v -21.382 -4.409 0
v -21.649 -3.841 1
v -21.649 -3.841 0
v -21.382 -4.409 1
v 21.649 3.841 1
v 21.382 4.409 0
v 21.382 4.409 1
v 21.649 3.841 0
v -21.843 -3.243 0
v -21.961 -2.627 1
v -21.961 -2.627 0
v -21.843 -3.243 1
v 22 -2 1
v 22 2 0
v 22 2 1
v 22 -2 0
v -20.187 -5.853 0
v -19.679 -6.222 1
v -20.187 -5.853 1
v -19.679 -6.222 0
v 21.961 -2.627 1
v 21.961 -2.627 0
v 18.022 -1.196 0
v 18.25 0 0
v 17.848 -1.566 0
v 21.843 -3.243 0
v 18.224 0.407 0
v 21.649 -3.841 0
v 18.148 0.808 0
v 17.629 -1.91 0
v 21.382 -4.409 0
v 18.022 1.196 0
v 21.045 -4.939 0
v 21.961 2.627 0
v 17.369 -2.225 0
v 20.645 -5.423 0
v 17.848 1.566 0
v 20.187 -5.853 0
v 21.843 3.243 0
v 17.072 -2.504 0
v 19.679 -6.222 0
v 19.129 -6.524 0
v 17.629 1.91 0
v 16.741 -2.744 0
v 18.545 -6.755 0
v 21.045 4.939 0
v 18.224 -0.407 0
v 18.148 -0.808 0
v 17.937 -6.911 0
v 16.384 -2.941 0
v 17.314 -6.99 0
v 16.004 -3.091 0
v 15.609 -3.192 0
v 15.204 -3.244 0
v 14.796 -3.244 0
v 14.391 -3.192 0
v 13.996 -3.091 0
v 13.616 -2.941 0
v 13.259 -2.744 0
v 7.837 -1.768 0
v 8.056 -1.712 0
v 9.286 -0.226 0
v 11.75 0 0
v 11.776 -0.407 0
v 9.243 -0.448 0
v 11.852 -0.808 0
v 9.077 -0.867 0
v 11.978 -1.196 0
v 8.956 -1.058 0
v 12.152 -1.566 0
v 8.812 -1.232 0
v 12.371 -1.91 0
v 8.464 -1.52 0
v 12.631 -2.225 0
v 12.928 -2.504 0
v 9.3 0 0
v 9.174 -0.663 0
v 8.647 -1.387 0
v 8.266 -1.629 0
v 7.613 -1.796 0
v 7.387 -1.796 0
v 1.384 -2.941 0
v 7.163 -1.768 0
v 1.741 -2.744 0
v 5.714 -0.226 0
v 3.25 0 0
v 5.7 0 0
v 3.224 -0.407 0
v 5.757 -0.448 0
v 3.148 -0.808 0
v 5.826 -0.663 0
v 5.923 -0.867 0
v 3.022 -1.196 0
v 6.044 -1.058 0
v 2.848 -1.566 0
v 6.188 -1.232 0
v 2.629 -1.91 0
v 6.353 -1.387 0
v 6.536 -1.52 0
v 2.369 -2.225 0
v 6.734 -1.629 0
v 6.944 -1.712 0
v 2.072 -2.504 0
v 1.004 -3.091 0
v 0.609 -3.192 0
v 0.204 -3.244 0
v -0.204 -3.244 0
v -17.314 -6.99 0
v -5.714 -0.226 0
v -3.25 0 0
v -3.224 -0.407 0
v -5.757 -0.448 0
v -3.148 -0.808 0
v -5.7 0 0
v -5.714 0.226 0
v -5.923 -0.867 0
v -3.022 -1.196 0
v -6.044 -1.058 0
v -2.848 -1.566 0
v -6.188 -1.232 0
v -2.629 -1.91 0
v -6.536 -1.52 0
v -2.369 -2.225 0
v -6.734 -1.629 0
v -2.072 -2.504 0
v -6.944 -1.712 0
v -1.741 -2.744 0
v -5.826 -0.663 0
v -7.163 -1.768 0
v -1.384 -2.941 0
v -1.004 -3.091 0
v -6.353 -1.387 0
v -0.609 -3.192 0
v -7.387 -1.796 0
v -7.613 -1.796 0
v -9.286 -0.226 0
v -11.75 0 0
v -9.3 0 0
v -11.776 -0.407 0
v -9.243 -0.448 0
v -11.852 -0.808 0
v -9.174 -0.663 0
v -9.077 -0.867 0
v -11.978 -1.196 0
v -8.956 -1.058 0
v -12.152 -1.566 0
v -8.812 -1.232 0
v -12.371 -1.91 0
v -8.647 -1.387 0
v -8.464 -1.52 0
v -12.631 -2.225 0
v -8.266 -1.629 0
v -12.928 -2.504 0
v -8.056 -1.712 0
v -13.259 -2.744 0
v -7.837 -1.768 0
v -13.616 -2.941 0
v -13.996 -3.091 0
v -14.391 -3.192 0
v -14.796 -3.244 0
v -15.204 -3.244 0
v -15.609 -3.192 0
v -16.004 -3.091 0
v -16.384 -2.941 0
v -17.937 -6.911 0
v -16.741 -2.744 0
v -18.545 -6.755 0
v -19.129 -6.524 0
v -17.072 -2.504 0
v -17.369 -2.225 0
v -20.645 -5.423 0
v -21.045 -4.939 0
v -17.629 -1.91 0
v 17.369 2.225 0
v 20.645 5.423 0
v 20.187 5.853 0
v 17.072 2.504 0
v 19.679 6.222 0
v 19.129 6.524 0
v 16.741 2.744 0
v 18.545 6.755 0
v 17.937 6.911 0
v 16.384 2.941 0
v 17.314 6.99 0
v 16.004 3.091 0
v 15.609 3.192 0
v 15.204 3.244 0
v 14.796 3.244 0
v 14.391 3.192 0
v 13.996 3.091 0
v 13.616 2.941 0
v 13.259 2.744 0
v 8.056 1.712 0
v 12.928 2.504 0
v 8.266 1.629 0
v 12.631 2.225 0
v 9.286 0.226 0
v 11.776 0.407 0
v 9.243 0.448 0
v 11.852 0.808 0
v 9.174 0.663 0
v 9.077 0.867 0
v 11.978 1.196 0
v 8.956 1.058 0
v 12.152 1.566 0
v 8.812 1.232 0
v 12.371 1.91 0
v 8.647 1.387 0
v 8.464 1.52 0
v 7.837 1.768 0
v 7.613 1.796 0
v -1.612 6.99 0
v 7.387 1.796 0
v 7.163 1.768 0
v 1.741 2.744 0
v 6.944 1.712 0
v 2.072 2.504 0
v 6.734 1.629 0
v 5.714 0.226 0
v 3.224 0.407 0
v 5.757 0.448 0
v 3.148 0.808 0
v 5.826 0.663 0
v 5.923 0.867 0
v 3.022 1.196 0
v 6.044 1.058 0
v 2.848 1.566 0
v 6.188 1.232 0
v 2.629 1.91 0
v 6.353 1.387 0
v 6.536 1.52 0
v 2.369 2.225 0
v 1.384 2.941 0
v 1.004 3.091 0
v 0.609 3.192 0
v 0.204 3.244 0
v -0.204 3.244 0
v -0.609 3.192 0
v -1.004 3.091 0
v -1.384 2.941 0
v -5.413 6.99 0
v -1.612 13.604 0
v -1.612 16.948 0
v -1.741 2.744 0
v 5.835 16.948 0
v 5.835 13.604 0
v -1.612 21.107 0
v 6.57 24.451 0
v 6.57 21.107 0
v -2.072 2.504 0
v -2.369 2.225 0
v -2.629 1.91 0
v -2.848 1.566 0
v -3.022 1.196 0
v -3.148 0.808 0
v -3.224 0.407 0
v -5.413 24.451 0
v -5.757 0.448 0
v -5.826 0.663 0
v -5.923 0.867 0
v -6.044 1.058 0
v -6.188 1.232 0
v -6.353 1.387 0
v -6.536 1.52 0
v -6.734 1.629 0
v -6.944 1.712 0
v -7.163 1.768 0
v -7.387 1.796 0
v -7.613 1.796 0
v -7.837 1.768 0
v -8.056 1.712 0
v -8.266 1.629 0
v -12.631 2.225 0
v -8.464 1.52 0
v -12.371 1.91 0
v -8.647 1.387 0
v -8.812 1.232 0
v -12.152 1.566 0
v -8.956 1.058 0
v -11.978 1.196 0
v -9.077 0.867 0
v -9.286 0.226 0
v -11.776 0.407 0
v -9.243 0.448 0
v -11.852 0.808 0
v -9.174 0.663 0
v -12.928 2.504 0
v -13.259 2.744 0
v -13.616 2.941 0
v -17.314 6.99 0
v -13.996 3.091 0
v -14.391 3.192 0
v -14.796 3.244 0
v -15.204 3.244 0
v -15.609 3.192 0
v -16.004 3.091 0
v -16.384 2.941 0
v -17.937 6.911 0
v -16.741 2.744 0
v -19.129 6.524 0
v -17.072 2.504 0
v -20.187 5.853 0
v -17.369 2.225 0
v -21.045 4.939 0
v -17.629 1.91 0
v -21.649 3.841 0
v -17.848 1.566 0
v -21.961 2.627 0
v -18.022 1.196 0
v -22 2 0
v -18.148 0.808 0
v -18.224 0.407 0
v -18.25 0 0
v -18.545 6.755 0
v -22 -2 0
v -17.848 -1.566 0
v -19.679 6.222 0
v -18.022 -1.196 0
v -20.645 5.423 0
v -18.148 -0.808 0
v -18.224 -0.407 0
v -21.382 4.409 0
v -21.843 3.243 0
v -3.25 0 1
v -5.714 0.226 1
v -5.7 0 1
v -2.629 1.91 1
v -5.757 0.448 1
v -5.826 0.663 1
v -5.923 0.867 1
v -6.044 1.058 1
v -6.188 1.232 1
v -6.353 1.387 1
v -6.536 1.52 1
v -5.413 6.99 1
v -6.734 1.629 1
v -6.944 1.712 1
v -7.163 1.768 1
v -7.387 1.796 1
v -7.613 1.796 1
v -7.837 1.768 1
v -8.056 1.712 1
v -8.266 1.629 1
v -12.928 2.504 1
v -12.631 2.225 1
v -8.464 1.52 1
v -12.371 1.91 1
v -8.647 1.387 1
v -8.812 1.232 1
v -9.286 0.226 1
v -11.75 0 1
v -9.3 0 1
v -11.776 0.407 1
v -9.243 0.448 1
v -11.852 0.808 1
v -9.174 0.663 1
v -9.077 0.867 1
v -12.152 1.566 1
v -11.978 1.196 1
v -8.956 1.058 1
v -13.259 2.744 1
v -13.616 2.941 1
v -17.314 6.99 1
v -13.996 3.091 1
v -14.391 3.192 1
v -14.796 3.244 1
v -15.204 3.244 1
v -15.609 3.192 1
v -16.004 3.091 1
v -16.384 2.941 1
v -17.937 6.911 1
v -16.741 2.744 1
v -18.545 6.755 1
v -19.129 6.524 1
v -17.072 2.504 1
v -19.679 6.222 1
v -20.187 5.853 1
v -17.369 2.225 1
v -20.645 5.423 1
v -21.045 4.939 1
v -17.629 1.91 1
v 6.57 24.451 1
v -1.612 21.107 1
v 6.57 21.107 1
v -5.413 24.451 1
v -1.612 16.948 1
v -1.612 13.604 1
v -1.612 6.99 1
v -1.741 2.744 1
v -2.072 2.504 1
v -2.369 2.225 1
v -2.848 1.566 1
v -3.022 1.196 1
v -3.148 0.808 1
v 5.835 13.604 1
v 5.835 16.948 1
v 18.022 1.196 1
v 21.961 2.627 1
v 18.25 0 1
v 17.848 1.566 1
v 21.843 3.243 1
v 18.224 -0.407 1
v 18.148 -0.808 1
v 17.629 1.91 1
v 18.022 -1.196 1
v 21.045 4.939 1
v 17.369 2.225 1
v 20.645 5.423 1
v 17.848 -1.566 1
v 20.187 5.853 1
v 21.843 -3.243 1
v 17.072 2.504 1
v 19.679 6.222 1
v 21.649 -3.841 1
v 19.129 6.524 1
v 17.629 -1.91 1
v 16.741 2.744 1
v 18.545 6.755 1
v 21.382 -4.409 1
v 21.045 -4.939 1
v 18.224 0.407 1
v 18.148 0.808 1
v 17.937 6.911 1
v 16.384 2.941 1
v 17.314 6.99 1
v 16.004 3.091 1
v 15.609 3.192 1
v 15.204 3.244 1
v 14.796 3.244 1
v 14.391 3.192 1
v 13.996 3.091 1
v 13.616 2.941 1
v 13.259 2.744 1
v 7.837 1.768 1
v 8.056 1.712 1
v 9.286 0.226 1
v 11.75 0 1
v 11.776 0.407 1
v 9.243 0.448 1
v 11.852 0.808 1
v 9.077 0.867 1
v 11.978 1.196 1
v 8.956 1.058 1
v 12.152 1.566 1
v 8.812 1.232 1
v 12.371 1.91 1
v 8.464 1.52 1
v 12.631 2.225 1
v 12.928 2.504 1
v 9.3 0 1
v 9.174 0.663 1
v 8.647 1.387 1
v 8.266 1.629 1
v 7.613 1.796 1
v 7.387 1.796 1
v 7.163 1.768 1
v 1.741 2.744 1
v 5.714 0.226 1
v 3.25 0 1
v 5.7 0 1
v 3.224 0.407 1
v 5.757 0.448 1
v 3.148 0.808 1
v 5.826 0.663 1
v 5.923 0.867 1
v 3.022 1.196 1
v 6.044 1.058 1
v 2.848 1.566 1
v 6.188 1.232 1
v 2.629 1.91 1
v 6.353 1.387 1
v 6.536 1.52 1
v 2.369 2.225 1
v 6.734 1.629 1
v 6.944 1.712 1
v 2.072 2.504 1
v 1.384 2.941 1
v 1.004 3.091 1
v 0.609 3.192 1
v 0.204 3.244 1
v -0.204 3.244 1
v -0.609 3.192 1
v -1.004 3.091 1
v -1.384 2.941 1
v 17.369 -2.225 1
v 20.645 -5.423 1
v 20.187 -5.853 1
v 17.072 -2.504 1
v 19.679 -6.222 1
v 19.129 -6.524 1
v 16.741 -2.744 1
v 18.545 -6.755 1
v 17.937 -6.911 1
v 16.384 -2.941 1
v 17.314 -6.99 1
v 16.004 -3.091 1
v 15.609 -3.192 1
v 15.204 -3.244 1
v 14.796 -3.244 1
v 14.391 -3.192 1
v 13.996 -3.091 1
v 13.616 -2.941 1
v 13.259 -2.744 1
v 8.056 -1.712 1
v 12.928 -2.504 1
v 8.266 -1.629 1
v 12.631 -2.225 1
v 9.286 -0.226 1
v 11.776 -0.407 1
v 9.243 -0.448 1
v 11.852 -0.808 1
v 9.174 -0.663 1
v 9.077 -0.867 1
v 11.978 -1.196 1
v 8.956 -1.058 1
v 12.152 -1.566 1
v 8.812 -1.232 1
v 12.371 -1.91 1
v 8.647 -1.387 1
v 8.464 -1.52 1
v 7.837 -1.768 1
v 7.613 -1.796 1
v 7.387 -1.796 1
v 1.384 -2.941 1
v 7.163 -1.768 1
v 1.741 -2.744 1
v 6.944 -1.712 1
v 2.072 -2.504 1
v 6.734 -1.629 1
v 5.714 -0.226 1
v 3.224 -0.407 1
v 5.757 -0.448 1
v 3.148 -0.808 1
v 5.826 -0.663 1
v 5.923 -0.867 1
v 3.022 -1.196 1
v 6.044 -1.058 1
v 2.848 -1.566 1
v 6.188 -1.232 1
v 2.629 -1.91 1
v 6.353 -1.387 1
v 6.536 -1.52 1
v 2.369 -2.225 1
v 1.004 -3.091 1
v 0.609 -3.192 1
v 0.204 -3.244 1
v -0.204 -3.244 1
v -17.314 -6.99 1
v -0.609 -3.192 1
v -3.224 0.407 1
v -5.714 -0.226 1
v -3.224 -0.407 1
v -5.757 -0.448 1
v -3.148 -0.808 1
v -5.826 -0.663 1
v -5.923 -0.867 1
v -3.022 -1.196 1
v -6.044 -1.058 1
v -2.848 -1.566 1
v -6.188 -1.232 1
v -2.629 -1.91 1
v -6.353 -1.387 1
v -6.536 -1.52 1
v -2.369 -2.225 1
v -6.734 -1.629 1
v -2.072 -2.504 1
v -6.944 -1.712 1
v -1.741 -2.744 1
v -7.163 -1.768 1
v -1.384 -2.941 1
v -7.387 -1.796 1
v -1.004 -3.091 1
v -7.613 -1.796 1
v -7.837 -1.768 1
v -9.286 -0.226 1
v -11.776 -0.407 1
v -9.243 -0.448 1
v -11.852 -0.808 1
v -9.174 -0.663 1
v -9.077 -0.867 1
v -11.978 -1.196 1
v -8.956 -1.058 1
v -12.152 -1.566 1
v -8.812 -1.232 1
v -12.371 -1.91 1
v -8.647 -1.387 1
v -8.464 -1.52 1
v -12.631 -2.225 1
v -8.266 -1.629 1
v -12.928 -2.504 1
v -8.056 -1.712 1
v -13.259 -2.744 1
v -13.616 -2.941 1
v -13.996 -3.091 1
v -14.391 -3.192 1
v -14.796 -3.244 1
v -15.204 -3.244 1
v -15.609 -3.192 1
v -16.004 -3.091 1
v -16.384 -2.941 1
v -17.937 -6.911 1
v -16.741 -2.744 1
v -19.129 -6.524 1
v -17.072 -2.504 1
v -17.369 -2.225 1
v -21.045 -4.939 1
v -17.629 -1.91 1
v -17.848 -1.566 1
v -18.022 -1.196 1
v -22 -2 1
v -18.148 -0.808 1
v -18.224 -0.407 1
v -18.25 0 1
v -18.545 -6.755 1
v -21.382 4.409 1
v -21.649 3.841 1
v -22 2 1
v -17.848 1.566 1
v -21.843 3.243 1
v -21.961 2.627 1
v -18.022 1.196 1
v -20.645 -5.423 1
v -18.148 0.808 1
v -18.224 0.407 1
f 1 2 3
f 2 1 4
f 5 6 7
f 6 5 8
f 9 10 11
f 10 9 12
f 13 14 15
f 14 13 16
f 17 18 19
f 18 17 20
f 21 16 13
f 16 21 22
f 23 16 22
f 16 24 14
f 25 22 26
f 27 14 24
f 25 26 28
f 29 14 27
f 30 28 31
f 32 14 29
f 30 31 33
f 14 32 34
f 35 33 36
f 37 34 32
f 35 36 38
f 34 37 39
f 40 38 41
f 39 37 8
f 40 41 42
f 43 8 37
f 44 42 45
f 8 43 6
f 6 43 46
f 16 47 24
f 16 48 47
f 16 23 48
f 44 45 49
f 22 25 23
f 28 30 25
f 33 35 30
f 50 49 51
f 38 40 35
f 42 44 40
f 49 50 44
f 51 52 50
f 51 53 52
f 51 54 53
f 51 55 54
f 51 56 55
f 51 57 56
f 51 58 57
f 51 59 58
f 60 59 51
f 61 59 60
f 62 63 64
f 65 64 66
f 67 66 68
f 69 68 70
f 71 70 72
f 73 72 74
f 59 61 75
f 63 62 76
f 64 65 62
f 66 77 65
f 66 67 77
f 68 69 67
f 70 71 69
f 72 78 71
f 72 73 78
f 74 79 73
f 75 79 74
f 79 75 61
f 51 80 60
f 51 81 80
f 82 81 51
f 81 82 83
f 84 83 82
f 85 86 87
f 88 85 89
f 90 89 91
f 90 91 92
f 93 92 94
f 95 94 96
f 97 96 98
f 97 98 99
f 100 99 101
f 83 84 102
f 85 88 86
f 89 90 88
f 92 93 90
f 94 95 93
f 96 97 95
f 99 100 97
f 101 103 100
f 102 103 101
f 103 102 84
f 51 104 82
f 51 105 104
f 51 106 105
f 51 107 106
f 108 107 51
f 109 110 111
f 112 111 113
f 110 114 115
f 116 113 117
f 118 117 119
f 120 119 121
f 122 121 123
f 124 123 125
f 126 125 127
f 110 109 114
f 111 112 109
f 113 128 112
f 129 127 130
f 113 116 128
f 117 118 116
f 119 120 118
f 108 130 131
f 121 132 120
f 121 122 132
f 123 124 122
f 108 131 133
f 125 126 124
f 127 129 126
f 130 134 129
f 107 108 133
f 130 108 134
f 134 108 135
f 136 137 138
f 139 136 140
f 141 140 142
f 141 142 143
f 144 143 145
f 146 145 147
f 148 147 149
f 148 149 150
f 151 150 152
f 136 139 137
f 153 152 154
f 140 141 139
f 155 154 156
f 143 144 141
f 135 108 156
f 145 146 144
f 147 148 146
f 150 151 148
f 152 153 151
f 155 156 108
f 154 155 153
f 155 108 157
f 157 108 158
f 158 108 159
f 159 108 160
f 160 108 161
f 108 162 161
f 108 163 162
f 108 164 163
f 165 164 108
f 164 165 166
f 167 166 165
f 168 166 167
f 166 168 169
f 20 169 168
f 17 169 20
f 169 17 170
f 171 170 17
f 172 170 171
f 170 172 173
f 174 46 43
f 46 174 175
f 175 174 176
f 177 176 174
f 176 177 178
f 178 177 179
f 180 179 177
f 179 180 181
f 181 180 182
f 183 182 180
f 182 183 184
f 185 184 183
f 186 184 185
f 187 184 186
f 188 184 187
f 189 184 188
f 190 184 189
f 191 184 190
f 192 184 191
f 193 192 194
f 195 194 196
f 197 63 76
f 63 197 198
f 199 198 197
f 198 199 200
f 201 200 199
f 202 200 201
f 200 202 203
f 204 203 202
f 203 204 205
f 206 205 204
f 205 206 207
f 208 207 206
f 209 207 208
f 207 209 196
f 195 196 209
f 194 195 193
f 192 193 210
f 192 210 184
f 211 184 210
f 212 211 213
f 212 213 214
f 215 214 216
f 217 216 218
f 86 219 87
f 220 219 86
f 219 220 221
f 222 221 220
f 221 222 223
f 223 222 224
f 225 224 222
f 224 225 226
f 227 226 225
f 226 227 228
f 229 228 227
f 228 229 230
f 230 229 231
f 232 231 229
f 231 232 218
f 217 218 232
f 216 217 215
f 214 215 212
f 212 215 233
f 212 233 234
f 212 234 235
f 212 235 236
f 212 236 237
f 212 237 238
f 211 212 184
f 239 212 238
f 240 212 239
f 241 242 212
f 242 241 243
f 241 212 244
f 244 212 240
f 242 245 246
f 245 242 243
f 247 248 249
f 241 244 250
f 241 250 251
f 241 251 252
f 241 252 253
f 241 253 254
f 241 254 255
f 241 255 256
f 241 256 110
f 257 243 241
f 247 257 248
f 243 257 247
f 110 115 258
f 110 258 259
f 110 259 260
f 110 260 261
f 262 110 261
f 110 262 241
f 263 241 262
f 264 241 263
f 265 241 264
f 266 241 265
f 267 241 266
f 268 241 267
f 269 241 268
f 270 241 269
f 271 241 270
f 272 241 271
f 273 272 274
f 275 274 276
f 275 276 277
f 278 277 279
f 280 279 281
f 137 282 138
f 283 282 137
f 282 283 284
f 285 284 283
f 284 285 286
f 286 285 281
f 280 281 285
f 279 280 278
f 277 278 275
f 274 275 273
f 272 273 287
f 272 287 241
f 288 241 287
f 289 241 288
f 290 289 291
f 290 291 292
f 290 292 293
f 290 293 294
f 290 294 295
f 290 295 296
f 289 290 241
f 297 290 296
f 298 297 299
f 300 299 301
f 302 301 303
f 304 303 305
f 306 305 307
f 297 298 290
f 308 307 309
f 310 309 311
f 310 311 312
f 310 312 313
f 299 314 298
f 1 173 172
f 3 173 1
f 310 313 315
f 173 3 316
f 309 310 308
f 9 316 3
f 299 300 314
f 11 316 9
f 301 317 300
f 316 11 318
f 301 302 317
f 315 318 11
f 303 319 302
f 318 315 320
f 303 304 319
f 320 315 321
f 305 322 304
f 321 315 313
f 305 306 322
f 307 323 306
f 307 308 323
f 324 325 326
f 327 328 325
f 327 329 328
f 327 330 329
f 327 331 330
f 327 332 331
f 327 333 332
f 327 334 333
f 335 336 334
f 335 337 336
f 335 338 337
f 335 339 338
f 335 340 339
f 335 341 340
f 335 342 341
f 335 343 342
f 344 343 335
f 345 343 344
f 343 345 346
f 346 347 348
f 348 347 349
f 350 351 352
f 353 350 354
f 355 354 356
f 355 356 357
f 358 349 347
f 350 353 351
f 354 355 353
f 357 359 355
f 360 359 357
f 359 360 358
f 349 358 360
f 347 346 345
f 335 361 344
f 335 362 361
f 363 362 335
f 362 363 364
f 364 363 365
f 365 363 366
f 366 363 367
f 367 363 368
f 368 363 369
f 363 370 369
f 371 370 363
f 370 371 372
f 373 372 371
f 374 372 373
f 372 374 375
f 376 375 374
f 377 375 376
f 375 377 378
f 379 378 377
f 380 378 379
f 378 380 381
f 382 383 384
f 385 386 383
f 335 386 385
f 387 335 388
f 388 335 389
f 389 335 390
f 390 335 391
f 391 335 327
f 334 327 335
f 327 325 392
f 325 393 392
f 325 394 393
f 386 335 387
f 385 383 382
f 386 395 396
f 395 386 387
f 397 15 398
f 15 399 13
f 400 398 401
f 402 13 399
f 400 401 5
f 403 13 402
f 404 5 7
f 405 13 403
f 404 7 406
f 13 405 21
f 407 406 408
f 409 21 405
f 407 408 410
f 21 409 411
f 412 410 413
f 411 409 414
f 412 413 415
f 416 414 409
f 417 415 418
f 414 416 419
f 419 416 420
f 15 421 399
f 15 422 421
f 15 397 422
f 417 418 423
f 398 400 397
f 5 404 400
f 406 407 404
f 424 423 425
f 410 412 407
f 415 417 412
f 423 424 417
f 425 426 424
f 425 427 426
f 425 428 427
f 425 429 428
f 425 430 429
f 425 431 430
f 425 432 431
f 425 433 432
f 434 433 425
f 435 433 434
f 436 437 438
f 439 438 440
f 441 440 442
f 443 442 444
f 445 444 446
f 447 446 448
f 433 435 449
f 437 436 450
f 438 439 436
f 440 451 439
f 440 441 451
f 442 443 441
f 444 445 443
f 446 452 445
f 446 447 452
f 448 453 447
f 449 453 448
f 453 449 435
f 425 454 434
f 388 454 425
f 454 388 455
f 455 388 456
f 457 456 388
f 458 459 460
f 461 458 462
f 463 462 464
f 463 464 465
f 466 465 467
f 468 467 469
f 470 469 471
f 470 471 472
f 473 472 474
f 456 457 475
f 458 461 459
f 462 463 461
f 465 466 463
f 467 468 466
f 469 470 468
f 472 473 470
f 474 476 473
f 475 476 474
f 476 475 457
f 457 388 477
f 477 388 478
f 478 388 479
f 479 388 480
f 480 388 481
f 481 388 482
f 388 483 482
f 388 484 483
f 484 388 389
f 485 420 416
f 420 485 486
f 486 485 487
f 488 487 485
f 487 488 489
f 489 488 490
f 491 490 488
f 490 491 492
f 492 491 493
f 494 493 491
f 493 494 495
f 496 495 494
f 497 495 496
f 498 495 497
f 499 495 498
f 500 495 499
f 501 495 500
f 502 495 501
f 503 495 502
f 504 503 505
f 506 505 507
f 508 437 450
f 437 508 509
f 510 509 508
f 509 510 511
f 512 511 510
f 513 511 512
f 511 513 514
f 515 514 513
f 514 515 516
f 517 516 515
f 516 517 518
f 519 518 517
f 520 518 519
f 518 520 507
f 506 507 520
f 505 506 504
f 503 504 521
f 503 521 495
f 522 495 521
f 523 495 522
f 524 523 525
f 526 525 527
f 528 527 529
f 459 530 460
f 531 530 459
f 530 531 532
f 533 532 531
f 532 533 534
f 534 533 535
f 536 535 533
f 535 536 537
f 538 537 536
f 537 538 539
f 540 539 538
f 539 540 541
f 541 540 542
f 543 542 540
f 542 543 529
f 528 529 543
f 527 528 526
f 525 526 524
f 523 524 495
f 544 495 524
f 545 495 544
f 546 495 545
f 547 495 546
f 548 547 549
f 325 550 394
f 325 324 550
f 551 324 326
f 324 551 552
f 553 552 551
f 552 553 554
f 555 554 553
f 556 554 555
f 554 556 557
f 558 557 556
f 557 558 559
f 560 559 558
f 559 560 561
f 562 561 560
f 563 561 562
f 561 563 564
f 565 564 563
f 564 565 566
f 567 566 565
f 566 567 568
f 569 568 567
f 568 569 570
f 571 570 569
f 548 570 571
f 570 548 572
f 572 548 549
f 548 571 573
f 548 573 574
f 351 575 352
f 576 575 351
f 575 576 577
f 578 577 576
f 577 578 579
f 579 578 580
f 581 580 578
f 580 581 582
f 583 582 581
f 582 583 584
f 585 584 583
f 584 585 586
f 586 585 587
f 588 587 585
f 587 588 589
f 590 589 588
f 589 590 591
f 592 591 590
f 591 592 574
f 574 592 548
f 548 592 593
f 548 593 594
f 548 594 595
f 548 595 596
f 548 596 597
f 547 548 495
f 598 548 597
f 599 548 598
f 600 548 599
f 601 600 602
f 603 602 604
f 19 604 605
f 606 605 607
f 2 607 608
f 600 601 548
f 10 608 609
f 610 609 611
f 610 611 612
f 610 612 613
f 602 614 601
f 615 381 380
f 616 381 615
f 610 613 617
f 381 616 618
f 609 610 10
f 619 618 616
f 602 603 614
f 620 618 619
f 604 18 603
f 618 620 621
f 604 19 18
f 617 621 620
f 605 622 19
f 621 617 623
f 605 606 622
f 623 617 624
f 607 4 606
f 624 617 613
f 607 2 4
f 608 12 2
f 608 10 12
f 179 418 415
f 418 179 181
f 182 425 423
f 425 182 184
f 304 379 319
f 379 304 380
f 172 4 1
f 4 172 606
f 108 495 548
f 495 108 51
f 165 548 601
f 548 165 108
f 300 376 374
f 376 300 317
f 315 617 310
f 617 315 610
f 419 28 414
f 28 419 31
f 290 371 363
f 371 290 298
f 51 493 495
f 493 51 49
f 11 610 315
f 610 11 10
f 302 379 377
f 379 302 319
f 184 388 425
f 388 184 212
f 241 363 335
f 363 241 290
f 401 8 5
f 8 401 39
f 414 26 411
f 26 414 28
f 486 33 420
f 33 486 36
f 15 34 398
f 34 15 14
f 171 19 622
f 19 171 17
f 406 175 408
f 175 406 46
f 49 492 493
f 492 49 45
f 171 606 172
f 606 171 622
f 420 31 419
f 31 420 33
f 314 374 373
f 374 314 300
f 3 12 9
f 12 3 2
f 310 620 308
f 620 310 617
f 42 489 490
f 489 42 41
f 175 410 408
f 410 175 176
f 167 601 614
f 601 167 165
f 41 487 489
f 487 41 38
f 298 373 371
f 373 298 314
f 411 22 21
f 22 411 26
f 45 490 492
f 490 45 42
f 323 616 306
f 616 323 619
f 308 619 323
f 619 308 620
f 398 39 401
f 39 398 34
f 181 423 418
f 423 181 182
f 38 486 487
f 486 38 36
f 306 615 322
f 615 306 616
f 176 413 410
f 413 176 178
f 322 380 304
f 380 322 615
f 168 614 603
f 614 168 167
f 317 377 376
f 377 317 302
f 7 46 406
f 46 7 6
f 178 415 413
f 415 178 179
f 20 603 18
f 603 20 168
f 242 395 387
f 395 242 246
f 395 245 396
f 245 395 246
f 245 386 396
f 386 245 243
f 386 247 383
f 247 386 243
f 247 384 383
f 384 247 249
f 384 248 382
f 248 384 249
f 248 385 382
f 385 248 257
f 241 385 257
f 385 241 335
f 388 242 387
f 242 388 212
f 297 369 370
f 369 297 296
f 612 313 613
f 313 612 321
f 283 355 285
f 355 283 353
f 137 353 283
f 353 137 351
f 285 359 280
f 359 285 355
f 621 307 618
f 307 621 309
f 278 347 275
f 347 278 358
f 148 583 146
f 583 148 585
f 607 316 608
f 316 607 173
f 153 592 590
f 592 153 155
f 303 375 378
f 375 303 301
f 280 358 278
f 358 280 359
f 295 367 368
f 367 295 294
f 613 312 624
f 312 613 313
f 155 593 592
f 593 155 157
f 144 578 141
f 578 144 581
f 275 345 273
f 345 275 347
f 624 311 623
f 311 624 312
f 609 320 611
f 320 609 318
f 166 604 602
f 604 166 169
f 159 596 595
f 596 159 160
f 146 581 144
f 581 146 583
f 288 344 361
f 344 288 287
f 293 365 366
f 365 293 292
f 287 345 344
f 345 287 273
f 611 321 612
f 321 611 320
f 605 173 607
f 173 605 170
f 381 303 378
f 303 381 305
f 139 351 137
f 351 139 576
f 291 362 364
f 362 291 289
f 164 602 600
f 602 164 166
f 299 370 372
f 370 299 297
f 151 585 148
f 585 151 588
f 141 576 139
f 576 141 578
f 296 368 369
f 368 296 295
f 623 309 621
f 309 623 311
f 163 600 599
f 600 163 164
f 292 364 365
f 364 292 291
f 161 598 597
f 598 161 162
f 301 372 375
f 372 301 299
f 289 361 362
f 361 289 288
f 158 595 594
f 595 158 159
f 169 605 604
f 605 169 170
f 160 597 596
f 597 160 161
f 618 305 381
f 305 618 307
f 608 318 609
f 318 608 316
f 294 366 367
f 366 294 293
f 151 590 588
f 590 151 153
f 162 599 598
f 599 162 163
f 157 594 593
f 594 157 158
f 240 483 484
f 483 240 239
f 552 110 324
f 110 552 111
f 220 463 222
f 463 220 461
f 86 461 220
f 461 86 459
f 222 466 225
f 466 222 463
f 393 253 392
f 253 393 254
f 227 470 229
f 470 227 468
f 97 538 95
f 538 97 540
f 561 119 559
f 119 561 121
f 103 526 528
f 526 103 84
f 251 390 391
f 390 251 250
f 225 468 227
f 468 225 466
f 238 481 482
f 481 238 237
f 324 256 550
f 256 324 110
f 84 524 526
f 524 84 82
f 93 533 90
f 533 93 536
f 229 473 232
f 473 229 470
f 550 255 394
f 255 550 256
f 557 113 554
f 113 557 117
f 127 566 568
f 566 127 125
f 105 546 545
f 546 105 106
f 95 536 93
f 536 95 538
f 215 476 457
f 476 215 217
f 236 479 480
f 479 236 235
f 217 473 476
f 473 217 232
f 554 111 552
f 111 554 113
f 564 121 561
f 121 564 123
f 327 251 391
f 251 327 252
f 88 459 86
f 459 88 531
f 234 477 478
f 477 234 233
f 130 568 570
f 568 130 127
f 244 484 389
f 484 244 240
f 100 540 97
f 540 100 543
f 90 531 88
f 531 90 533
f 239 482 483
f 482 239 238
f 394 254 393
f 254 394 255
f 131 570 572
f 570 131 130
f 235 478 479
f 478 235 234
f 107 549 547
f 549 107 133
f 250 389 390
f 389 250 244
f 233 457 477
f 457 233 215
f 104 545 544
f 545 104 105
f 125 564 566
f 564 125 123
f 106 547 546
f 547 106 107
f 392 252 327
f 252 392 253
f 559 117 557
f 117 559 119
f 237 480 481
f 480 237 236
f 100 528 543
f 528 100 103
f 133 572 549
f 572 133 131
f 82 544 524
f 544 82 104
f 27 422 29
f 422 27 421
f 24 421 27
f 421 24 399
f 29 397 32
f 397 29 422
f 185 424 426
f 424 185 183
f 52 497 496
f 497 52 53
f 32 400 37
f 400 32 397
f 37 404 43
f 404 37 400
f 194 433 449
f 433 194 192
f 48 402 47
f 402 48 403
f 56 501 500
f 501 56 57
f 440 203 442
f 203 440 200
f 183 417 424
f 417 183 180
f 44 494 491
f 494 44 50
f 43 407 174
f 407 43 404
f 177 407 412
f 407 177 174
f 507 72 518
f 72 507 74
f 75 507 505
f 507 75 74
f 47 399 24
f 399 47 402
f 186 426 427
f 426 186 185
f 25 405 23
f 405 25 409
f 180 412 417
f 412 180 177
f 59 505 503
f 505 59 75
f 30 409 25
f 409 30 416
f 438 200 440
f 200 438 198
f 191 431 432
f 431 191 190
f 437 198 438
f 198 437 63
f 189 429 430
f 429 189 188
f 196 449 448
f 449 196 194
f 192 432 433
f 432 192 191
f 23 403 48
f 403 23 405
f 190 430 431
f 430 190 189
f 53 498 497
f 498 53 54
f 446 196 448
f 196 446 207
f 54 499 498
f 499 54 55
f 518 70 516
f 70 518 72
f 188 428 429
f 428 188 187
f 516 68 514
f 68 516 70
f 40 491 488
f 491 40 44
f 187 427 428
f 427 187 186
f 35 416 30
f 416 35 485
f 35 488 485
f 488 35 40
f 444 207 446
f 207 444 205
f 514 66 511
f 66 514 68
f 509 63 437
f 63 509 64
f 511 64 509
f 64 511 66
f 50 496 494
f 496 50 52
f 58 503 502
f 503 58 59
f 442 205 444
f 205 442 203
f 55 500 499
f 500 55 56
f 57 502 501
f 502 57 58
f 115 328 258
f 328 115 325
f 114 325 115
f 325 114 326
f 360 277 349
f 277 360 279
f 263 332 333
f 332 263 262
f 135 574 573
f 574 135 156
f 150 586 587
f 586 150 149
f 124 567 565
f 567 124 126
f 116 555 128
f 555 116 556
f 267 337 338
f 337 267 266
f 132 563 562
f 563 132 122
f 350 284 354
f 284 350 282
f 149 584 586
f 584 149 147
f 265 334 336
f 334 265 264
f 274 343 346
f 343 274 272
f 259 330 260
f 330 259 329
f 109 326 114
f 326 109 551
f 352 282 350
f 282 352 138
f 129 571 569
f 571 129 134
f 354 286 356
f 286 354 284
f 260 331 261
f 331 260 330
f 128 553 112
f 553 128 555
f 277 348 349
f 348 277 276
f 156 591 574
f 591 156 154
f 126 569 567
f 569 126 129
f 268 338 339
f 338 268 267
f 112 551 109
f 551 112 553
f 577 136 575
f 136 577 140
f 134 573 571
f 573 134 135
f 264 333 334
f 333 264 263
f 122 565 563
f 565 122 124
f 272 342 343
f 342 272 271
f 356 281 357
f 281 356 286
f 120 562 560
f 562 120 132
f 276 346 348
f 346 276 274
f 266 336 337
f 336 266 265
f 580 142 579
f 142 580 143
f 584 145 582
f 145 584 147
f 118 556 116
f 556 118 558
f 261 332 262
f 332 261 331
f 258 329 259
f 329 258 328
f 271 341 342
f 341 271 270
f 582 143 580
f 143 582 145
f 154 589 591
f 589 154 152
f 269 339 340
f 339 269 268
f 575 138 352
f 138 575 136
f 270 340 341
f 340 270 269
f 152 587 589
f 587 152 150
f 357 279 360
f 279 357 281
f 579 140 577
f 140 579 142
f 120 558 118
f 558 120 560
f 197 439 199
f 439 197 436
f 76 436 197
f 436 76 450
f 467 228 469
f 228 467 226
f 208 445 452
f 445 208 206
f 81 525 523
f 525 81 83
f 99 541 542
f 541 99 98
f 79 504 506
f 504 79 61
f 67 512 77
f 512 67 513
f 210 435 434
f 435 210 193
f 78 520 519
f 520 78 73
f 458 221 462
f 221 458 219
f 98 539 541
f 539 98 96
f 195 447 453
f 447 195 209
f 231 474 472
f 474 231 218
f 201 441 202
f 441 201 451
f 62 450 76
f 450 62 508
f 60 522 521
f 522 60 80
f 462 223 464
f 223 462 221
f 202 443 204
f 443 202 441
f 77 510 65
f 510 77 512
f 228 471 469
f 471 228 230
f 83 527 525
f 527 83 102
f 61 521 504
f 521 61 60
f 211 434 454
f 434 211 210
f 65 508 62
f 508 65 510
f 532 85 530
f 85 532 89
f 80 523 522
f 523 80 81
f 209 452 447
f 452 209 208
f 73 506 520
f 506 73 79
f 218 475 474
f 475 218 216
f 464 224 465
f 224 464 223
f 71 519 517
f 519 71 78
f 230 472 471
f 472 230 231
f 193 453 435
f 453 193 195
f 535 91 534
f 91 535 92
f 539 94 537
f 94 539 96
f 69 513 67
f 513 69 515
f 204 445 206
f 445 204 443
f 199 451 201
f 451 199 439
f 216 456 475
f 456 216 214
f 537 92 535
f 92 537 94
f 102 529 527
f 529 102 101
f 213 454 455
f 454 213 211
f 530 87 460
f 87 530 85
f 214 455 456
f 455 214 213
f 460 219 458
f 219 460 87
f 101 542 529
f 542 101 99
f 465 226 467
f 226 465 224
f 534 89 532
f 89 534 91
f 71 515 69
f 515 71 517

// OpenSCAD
$fn = 50;


difference() {
	union() {
		hull() {
			translate(v = [-17.0000000000, 2.0000000000, 0]) {
				cylinder(h = 1, r = 5);
			}
			translate(v = [17.0000000000, 2.0000000000, 0]) {
				cylinder(h = 1, r = 5);
			}
			translate(v = [-17.0000000000, -2.0000000000, 0]) {
				cylinder(h = 1, r = 5);
			}
			translate(v = [17.0000000000, -2.0000000000, 0]) {
				cylinder(h = 1, r = 5);
			}
		}
		translate(v = [0, 24, 0]) {
			linear_extrude(height = 1) {
				text(font = "DejaVu Sans Mono:style=Bold", halign = "center", size = 19.0000000000, text = "F", valign = "top");
			}
		}
	}
	union() {
		translate(v = [-15.0000000000, 0.0000000000, 0]) {
			translate(v = [0, 0, -100]) {
				cylinder(h = 200, r = 3.2500000000);
			}
		}
		translate(v = [0, 0, -100]) {
			cylinder(h = 200, r = 3.2500000000);
		}
		translate(v = [15.0000000000, 0.0000000000, 0]) {
			translate(v = [0, 0, -100]) {
				cylinder(h = 200, r = 3.2500000000);
			}
		}
		translate(v = [-15.0000000000, 0.0000000000, 0]) {
			translate(v = [0, 0, -100]) {
				cylinder(h = 200, r = 1.8000000000);
			}
		}
		translate(v = [-7.5000000000, 0.0000000000, 0]) {
			translate(v = [0, 0, -100]) {
				cylinder(h = 200, r = 1.8000000000);
			}
		}
		translate(v = [0, 0, -100]) {
			cylinder(h = 200, r = 1.8000000000);
		}
		translate(v = [7.5000000000, 0.0000000000, 0]) {
			translate(v = [0, 0, -100]) {
				cylinder(h = 200, r = 1.8000000000);
			}
		}
		translate(v = [15.0000000000, 0.0000000000, 0]) {
			translate(v = [0, 0, -100]) {
				cylinder(h = 200, r = 1.8000000000);
			}
		}
	}
}
